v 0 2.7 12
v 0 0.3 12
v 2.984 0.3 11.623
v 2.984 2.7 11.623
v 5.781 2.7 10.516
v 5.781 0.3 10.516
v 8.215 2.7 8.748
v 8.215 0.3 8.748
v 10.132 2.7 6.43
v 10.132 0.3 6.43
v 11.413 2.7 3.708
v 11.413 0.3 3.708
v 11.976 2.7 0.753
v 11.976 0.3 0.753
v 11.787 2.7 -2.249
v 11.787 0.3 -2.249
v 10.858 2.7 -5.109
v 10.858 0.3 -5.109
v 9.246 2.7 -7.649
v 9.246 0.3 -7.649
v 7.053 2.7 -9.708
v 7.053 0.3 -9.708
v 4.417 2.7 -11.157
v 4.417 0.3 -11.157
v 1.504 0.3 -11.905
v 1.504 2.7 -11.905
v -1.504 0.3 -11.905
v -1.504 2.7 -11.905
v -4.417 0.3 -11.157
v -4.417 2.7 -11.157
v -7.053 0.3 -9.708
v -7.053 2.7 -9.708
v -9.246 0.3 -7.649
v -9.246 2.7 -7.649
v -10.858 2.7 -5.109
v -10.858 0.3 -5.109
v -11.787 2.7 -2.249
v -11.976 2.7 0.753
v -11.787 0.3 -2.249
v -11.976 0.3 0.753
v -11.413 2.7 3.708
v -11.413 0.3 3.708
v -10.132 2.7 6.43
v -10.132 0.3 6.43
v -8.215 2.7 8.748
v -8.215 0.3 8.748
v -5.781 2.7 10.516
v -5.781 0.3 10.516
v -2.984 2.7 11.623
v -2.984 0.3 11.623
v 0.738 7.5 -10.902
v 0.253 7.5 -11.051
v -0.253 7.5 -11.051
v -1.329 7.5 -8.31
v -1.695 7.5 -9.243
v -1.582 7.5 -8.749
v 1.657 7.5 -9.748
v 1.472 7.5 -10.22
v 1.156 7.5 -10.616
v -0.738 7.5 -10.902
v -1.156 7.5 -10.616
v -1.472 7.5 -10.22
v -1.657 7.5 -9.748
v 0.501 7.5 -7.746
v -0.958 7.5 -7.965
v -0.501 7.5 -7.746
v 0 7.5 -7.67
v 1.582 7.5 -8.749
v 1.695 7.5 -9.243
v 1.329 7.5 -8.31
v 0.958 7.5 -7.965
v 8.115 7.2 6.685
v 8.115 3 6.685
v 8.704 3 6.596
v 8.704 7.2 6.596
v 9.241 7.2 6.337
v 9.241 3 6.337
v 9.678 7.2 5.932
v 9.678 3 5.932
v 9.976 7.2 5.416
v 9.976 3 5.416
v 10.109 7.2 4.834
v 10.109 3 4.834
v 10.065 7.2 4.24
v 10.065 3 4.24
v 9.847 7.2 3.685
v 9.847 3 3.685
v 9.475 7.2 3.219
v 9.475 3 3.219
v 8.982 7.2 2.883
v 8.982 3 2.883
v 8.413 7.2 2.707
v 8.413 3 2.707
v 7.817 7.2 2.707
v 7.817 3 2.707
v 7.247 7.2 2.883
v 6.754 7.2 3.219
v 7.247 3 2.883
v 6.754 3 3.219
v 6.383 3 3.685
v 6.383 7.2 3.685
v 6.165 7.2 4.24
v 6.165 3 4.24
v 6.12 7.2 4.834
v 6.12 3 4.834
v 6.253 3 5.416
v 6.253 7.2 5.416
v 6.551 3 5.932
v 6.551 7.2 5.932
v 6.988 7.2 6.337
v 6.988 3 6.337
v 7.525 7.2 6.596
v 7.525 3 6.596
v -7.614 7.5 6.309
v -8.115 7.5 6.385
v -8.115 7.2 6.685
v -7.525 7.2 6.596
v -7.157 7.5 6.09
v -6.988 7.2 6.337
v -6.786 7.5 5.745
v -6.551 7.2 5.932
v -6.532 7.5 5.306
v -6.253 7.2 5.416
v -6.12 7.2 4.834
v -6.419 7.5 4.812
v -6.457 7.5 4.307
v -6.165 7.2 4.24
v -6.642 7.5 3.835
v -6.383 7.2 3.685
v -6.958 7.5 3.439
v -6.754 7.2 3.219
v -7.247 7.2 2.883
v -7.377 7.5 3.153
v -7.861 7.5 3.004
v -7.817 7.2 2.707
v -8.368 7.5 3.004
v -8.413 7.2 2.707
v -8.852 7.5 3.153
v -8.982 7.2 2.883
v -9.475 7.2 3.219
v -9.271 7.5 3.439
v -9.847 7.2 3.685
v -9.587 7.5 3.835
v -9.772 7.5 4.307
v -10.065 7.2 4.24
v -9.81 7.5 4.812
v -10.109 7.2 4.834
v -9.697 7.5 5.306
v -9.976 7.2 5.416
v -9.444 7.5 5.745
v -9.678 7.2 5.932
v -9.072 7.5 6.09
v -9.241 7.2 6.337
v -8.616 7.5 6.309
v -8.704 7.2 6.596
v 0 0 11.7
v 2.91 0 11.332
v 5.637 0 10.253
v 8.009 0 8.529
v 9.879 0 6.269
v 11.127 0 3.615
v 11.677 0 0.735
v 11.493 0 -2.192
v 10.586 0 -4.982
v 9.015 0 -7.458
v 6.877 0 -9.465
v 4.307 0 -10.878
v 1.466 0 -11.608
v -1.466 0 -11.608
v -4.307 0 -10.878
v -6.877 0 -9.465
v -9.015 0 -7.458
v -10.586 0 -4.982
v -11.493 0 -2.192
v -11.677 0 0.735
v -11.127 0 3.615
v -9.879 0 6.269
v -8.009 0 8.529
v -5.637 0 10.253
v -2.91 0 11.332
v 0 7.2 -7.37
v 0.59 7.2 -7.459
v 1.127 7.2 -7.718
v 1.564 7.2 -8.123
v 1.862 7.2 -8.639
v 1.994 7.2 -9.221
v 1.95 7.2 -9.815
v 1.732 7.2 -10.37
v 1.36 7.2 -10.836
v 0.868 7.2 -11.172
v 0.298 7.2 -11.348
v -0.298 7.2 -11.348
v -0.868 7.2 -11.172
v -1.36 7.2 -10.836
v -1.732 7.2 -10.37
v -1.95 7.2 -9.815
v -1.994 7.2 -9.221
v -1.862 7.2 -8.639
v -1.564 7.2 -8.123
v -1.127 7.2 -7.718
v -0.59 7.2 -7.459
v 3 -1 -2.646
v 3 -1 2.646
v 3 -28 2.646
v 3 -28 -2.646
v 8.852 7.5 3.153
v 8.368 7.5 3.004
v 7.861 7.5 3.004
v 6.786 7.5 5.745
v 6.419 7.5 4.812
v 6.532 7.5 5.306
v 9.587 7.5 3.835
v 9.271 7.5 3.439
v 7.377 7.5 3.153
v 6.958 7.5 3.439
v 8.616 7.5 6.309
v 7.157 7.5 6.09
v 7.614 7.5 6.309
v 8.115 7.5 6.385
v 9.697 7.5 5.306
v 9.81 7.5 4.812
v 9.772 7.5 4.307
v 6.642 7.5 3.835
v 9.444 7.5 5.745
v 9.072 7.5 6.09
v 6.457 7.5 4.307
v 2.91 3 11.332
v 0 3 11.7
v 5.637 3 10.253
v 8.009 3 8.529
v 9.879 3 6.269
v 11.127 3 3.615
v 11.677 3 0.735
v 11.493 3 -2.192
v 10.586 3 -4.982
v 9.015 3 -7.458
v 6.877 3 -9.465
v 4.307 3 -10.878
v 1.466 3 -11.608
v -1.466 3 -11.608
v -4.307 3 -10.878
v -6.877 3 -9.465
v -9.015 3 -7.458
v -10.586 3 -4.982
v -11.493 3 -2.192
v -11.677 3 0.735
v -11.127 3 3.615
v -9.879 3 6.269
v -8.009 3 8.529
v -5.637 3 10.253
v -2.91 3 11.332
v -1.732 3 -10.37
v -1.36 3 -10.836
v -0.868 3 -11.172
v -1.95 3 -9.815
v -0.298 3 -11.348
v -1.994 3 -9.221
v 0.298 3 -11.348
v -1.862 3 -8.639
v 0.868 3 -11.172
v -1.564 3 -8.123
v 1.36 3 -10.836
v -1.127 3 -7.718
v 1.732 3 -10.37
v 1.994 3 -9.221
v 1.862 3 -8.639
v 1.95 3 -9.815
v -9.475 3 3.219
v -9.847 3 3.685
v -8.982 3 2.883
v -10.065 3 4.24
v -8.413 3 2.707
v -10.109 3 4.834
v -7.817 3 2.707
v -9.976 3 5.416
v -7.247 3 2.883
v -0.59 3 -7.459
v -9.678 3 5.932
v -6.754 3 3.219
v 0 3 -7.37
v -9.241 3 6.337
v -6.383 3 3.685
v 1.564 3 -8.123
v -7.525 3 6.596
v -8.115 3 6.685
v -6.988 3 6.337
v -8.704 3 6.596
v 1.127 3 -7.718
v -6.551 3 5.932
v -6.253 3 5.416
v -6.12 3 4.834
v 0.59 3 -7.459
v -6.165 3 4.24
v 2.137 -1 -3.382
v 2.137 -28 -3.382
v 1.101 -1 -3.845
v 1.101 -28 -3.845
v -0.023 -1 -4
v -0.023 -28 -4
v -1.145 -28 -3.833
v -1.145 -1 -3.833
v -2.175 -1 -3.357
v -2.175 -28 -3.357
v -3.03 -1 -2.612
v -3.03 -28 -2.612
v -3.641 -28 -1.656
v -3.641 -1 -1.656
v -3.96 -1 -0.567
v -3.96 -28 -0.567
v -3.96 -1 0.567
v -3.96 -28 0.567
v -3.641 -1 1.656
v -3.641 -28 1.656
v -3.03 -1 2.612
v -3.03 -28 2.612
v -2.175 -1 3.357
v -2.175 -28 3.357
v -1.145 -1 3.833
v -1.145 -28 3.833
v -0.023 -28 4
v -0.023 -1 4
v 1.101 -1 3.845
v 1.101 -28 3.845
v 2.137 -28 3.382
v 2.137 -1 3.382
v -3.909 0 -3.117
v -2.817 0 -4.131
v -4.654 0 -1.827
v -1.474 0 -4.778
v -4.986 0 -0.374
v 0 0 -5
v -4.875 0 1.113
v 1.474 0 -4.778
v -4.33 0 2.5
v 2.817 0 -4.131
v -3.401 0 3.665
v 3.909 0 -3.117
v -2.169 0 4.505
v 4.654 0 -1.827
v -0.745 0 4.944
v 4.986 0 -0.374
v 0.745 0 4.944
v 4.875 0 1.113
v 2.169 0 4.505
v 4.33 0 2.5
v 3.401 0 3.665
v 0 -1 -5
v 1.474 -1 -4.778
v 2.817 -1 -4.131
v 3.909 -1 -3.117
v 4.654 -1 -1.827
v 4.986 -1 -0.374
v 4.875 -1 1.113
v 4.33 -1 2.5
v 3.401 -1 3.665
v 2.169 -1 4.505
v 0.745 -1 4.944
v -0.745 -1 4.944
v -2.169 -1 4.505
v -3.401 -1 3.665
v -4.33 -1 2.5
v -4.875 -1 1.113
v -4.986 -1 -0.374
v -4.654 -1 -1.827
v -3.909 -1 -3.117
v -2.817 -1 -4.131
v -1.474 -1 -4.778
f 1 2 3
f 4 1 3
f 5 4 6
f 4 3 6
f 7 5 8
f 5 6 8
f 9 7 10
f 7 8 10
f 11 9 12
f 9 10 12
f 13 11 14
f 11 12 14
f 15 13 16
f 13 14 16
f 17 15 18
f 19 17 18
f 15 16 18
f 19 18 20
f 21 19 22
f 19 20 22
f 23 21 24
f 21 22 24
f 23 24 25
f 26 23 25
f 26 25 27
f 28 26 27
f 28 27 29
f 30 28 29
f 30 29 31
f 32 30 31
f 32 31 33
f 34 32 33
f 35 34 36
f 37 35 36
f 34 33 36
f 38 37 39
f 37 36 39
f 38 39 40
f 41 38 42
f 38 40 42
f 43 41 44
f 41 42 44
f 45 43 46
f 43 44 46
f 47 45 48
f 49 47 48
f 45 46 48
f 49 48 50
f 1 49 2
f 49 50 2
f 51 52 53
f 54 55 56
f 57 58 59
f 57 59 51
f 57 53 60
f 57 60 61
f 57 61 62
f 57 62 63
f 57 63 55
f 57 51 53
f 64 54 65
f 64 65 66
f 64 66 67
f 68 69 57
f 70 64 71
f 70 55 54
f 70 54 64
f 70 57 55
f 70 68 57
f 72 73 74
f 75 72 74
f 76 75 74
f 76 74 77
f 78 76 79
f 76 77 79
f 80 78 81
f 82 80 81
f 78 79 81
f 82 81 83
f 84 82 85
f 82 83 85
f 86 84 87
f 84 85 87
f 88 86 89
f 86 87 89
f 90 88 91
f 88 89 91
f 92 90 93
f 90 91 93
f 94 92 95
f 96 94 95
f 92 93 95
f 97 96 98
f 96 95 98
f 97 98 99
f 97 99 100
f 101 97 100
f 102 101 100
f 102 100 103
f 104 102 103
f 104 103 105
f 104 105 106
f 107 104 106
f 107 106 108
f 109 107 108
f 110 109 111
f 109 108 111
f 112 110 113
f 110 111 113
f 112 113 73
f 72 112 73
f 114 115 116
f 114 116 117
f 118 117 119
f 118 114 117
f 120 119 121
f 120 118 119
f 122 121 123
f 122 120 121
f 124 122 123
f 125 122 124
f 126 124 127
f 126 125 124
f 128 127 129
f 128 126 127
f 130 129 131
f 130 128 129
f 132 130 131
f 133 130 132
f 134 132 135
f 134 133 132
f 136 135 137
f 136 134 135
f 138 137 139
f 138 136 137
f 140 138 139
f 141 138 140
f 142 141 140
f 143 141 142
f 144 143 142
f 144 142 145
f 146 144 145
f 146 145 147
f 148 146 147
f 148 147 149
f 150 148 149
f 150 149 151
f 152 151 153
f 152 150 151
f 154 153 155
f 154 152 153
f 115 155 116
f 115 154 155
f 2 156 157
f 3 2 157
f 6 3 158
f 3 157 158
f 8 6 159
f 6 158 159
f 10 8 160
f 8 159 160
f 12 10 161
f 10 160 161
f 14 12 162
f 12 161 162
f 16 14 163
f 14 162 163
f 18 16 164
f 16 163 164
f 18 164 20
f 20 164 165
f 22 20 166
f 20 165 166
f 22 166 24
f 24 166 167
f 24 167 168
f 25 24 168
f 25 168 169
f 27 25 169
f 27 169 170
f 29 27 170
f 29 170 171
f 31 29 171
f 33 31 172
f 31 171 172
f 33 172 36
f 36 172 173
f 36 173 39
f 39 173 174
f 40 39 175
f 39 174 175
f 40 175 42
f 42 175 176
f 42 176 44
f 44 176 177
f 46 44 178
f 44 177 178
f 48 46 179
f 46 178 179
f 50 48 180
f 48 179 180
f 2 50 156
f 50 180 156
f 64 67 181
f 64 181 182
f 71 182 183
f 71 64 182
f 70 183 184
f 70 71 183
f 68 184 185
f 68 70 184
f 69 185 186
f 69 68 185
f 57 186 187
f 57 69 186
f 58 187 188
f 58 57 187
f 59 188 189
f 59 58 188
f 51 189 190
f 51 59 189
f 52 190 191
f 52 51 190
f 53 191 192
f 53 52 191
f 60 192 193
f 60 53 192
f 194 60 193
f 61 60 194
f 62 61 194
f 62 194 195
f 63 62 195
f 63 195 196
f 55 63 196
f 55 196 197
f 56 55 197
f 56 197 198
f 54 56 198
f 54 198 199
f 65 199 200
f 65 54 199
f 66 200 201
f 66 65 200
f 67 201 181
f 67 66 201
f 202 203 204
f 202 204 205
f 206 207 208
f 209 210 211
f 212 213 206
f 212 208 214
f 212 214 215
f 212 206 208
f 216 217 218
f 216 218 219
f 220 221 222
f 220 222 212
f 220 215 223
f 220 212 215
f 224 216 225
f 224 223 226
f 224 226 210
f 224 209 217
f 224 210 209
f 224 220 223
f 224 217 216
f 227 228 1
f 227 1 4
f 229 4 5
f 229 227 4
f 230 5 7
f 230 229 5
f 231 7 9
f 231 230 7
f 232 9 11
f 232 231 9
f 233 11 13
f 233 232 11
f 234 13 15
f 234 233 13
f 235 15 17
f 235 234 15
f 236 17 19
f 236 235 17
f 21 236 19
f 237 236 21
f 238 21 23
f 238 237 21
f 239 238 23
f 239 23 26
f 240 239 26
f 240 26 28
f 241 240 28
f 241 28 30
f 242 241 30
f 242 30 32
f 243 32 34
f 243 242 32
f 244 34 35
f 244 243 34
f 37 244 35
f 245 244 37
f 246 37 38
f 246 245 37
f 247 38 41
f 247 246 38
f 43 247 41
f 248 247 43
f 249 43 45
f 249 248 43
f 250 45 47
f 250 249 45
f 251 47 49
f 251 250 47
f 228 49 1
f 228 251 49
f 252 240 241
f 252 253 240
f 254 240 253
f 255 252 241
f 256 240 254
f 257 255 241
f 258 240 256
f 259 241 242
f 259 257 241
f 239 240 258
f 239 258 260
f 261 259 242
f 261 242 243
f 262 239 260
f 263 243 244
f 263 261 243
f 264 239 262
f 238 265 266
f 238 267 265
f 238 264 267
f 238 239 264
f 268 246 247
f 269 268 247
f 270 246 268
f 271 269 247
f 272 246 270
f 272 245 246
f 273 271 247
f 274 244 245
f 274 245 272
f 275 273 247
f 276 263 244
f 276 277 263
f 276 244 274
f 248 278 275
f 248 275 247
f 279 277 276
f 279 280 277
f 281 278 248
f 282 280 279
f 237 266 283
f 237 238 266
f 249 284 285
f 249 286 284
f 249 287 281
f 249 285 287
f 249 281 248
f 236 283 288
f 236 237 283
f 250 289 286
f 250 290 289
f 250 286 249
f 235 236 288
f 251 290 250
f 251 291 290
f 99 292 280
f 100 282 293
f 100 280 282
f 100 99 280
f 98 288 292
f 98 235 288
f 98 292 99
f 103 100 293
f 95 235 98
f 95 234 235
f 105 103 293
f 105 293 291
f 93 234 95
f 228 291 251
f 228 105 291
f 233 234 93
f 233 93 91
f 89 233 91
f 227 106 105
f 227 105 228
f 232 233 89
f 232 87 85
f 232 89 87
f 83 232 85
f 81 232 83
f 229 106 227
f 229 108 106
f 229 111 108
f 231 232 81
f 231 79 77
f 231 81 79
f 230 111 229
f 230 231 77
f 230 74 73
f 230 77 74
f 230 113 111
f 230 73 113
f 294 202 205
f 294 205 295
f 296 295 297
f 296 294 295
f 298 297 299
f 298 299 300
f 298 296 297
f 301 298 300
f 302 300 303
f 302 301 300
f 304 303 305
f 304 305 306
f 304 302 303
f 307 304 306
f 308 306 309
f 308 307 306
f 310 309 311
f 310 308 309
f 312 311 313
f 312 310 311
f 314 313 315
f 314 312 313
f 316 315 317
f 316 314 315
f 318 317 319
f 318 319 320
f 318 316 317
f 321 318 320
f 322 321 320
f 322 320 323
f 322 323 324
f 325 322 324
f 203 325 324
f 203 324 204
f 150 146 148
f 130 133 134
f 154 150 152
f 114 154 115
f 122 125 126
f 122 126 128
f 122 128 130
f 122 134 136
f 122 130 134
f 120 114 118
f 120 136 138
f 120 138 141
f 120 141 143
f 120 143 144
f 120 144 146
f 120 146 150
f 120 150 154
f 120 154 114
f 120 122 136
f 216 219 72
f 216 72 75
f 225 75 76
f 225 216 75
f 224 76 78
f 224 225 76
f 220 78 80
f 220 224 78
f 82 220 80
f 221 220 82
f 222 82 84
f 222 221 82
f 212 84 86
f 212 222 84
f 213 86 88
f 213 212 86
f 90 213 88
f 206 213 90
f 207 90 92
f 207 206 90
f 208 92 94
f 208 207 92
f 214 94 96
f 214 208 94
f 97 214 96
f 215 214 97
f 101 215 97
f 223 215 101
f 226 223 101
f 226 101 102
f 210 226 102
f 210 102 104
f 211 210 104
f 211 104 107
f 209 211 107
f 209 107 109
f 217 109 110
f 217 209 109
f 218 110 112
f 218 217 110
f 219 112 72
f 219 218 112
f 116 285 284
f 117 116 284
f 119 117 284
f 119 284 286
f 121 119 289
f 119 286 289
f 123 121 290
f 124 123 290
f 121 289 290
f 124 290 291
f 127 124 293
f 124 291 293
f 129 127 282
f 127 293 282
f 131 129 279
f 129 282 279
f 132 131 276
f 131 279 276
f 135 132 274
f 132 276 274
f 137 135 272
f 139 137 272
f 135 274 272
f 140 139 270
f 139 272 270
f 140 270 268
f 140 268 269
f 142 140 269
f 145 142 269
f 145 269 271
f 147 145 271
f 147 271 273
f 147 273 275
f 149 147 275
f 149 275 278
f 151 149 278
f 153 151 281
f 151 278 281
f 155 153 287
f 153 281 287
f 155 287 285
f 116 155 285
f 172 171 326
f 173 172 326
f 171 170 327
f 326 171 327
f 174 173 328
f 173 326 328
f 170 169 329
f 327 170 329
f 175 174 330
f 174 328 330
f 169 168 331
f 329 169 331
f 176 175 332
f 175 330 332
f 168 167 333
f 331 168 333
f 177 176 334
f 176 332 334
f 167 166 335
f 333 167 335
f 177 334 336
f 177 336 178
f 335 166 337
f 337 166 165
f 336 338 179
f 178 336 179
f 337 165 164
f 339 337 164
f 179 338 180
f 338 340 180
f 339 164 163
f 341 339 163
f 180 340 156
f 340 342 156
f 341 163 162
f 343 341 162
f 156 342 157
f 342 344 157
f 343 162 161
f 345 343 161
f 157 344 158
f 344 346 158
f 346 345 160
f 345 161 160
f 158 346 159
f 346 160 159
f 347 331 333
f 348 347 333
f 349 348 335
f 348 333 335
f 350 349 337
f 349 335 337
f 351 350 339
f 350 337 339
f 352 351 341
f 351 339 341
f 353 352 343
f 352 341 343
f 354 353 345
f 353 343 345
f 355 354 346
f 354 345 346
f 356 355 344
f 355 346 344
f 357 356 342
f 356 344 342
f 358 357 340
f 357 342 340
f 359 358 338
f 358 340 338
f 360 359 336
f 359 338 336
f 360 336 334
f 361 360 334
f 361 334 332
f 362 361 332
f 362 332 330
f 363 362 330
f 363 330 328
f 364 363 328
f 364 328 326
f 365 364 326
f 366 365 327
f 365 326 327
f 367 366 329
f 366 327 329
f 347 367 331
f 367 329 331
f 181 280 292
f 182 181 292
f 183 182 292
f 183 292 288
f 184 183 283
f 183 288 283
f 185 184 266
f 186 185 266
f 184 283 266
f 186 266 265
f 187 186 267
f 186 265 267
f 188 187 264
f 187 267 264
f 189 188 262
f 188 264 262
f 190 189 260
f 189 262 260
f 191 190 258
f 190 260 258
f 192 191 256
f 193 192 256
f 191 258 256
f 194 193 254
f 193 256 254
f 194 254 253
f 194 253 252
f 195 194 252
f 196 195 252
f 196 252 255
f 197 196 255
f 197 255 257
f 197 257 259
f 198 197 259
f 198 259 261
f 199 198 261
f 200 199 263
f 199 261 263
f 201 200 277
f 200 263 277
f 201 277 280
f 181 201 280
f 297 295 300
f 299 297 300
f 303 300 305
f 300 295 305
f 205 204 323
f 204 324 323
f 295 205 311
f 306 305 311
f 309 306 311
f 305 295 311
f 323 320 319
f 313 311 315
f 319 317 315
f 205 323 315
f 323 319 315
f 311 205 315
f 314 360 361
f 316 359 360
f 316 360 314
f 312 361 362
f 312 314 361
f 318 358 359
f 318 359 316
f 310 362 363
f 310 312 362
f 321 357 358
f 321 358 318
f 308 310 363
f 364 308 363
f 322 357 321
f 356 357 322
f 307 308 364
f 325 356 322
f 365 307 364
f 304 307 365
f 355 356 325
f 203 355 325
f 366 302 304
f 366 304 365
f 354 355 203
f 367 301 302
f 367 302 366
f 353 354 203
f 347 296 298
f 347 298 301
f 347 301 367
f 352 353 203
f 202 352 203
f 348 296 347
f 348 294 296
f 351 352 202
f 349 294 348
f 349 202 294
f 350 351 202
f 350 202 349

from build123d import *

# Parameters (mm, degrees)
SKETCH1_R           = 12
BOSS_EXTRUDE1_DEPTH = 3
SKETCH2_R           = 2
BOSS_EXTRUDE2_DEPTH = 4.5
SKETCH3_R           = 5
BOSS_EXTRUDE3_DEPTH = 1
BOSS_EXTRUDE4_DEPTH = 27
CHAMFER1_SIZE       = 0.3


with BuildPart() as part:
    # Sketch1 → Boss-Extrude1 (new body)
    with BuildSketch(Plane(origin=(0, 0, 0), x_dir=(1, 0, 0), z_dir=(0, 1, 0))):
        with Locations(Location((0, 0, 0), (0, 0, 270))):
            Circle(SKETCH1_R)
    extrude(amount=BOSS_EXTRUDE1_DEPTH)

    # Sketch2 → Boss-Extrude2 (add)
    with BuildSketch(Plane(origin=(0, 3, 0), x_dir=(1, 0, 0), z_dir=(0, 1, 0))):
        with Locations(Location((0, 9.37, 0), (0, 0, 270))):
            Circle(SKETCH2_R)
        with Locations(Location((-8.114658033, -4.685, 0), (0, 0, 270))):
            Circle(SKETCH2_R)
        with Locations(Location((8.114658033, -4.685, 0), (0, 0, 270))):
            Circle(SKETCH2_R)
    extrude(amount=BOSS_EXTRUDE2_DEPTH)

    # Sketch3 → Boss-Extrude3 (add)
    with BuildSketch(Plane.XZ):
        with Locations(Location((0, 0, 0), (0, 0, 270))):
            Circle(SKETCH3_R)
    extrude(amount=BOSS_EXTRUDE3_DEPTH)

    # Sketch4 → Boss-Extrude4 (add)
    with BuildSketch(Plane.XZ.offset(1)):
        with BuildLine():
            Line((3, 2.645751311), (3, -2.645751311))
            ThreePointArc((3, -2.645751311), (-4, 0), (3, 2.645751311))
        make_face()
    extrude(amount=BOSS_EXTRUDE4_DEPTH)

    # Chamfer1
    chamfer1_edges = [part.edges().sort_by_distance(p)[0] for p in [
        (-8.114658033, 7.5, 2.685),
        (8.114658033, 7.5, 2.685),
        (0, 0, -12),
        (0, 3, -12),
        (0, 7.5, -11.37),
    ]]
    chamfer(chamfer1_edges, length=CHAMFER1_SIZE)


solid = part.part
